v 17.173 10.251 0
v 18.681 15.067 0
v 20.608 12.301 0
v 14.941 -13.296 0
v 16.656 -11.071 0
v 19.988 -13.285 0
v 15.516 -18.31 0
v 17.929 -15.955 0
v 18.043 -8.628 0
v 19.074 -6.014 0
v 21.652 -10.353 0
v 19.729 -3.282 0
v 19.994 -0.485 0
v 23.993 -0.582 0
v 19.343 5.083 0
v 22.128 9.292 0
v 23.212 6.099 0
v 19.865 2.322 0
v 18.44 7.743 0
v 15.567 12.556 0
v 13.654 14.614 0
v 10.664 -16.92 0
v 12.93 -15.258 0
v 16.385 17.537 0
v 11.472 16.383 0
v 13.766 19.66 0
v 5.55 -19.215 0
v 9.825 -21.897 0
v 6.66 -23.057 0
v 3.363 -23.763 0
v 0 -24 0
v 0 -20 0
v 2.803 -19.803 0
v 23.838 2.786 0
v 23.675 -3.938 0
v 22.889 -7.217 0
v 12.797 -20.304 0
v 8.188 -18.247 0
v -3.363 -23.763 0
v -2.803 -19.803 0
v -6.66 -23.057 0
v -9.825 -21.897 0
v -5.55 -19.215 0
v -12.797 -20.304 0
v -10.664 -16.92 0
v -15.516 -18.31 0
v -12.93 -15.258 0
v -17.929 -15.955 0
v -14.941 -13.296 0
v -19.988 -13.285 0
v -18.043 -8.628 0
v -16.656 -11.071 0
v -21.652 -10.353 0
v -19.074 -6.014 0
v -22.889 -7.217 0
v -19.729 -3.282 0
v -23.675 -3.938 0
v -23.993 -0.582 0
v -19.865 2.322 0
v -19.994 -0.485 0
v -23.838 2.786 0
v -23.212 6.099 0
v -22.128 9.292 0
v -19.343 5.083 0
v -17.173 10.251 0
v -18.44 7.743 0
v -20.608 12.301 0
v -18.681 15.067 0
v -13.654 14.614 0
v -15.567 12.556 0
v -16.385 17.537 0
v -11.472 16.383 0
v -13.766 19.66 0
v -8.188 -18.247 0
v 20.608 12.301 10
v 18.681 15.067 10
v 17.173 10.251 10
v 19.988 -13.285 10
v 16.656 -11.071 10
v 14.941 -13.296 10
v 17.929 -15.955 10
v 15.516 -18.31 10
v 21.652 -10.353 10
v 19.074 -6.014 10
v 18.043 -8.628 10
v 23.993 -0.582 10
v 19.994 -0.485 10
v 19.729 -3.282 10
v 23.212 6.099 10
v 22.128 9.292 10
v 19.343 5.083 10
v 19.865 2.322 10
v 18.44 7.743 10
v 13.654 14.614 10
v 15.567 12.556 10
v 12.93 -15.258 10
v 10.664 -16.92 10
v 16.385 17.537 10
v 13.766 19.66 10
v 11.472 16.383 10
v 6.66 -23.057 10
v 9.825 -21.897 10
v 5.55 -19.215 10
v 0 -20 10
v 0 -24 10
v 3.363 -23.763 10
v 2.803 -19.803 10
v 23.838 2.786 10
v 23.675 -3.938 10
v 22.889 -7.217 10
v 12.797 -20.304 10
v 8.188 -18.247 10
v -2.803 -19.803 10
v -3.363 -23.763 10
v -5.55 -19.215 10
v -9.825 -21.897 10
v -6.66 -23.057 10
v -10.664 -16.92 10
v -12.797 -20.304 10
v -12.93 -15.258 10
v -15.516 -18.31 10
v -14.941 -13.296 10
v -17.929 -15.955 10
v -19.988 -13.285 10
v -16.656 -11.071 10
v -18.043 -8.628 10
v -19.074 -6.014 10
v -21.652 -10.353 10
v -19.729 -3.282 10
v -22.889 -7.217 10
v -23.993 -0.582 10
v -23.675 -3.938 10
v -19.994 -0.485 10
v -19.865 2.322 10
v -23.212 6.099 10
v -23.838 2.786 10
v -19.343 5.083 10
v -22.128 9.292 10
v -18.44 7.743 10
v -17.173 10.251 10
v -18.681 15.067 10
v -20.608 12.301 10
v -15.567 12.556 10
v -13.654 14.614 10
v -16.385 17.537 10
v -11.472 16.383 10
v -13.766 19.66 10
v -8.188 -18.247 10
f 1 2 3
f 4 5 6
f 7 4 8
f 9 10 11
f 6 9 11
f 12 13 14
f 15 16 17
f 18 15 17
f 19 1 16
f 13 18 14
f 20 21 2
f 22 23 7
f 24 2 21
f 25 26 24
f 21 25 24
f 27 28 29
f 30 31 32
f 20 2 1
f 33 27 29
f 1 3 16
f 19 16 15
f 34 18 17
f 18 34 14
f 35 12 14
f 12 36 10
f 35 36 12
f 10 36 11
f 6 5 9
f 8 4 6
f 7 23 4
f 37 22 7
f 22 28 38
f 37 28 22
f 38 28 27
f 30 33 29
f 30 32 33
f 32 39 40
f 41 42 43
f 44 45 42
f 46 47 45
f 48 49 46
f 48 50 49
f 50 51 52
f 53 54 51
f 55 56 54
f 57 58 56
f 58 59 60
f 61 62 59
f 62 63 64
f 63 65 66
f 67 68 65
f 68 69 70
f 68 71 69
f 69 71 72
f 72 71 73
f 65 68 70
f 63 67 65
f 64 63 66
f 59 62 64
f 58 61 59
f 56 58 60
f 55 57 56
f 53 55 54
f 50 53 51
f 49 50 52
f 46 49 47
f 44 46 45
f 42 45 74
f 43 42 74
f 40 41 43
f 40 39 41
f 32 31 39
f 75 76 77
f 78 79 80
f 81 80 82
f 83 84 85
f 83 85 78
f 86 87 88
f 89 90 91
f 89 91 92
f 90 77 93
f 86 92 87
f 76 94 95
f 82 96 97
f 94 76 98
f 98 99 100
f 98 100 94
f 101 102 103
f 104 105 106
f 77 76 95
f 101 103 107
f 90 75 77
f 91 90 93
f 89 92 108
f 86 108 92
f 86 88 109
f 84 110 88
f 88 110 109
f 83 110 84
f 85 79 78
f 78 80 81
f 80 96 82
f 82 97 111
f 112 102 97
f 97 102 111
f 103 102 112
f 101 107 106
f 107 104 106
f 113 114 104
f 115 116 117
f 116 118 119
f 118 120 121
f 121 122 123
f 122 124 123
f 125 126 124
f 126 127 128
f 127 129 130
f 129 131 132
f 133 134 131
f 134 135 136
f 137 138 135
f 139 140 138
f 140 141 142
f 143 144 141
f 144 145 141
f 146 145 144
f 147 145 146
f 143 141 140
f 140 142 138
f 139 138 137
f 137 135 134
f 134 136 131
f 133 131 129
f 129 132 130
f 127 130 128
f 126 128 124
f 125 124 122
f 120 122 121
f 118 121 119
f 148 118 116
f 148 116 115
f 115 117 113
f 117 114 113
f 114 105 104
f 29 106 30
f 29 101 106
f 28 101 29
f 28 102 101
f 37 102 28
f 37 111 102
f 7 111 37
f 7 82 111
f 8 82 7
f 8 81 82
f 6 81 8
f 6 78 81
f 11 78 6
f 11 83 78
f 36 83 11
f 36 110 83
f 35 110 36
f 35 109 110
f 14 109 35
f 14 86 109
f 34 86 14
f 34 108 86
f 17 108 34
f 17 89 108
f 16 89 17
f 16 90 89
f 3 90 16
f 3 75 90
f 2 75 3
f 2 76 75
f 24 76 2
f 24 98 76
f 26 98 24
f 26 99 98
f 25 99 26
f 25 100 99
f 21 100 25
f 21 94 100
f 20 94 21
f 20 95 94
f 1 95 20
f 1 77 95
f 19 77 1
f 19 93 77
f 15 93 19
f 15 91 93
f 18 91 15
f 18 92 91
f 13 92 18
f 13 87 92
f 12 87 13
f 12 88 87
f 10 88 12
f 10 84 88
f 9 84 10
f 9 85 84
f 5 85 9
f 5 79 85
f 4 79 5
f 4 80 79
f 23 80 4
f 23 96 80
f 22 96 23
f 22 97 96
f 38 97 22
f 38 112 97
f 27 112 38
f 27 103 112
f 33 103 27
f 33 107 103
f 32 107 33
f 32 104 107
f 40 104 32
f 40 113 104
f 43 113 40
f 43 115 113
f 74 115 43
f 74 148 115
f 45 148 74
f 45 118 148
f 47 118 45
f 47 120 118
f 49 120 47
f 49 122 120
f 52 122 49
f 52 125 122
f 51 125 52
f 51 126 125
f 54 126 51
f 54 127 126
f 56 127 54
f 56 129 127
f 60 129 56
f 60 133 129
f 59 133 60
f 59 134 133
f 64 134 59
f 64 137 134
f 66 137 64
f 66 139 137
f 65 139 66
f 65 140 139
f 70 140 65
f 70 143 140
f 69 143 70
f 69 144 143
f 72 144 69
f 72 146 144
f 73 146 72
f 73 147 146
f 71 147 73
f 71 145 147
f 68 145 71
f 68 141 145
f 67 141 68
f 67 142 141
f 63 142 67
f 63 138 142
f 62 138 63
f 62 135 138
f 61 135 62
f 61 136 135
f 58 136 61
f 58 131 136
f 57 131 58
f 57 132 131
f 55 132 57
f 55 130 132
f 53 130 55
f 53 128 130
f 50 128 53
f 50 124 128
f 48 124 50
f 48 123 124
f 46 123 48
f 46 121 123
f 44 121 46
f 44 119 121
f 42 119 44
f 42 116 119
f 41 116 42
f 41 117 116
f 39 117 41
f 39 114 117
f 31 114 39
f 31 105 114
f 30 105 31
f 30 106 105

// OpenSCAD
$fn = 32;

// ----------------------------------------------------------------------
// Spring clip: 48 mm outside, 4 mm band, 70 degree opening
// ----------------------------------------------------------------------

// --- parameters (mm) ---
outer_r = 24;             // clip outside radius
inner_r = 20;             // clip bore radius
band = 4;                 // band thickness
clip_w = 10;              // clip width
opening = 70;             // opening angle

clip_profile = [[-13.766, 19.66], [-16.385, 17.537], [-18.681, 15.067], [-20.608, 12.301], [-22.128, 9.292], [-23.212, 6.099], [-23.838, 2.786], [-23.993, -0.582], [-23.675, -3.938], [-22.889, -7.217], [-21.652, -10.353], [-19.988, -13.285], [-17.929, -15.955], [-15.516, -18.31], [-12.797, -20.304], [-9.825, -21.897], [-6.66, -23.057], [-3.363, -23.763], [0, -24], [3.363, -23.763], [6.66, -23.057], [9.825, -21.897], [12.797, -20.304], [15.516, -18.31], [17.929, -15.955], [19.988, -13.285], [21.652, -10.353], [22.889, -7.217], [23.675, -3.938], [23.993, -0.582], [23.838, 2.786], [23.212, 6.099], [22.128, 9.292], [20.608, 12.301], [18.681, 15.067], [16.385, 17.537], [13.766, 19.66], [11.472, 16.383], [13.654, 14.614], [15.567, 12.556], [17.173, 10.251], [18.44, 7.743], [19.343, 5.083], [19.865, 2.322], [19.994, -0.485], [19.729, -3.282], [19.074, -6.014], [18.043, -8.628], [16.656, -11.071], [14.941, -13.296], [12.93, -15.258], [10.664, -16.92], [8.188, -18.247], [5.55, -19.215], [2.803, -19.803], [0, -20], [-2.803, -19.803], [-5.55, -19.215], [-8.188, -18.247], [-10.664, -16.92], [-12.93, -15.258], [-14.941, -13.296], [-16.656, -11.071], [-18.043, -8.628], [-19.074, -6.014], [-19.729, -3.282], [-19.994, -0.485], [-19.865, 2.322], [-19.343, 5.083], [-18.44, 7.743], [-17.173, 10.251], [-15.567, 12.556], [-13.654, 14.614], [-11.472, 16.383]];

difference() {
  union() {
    linear_extrude(height = clip_w) polygon(clip_profile);
  }
}
